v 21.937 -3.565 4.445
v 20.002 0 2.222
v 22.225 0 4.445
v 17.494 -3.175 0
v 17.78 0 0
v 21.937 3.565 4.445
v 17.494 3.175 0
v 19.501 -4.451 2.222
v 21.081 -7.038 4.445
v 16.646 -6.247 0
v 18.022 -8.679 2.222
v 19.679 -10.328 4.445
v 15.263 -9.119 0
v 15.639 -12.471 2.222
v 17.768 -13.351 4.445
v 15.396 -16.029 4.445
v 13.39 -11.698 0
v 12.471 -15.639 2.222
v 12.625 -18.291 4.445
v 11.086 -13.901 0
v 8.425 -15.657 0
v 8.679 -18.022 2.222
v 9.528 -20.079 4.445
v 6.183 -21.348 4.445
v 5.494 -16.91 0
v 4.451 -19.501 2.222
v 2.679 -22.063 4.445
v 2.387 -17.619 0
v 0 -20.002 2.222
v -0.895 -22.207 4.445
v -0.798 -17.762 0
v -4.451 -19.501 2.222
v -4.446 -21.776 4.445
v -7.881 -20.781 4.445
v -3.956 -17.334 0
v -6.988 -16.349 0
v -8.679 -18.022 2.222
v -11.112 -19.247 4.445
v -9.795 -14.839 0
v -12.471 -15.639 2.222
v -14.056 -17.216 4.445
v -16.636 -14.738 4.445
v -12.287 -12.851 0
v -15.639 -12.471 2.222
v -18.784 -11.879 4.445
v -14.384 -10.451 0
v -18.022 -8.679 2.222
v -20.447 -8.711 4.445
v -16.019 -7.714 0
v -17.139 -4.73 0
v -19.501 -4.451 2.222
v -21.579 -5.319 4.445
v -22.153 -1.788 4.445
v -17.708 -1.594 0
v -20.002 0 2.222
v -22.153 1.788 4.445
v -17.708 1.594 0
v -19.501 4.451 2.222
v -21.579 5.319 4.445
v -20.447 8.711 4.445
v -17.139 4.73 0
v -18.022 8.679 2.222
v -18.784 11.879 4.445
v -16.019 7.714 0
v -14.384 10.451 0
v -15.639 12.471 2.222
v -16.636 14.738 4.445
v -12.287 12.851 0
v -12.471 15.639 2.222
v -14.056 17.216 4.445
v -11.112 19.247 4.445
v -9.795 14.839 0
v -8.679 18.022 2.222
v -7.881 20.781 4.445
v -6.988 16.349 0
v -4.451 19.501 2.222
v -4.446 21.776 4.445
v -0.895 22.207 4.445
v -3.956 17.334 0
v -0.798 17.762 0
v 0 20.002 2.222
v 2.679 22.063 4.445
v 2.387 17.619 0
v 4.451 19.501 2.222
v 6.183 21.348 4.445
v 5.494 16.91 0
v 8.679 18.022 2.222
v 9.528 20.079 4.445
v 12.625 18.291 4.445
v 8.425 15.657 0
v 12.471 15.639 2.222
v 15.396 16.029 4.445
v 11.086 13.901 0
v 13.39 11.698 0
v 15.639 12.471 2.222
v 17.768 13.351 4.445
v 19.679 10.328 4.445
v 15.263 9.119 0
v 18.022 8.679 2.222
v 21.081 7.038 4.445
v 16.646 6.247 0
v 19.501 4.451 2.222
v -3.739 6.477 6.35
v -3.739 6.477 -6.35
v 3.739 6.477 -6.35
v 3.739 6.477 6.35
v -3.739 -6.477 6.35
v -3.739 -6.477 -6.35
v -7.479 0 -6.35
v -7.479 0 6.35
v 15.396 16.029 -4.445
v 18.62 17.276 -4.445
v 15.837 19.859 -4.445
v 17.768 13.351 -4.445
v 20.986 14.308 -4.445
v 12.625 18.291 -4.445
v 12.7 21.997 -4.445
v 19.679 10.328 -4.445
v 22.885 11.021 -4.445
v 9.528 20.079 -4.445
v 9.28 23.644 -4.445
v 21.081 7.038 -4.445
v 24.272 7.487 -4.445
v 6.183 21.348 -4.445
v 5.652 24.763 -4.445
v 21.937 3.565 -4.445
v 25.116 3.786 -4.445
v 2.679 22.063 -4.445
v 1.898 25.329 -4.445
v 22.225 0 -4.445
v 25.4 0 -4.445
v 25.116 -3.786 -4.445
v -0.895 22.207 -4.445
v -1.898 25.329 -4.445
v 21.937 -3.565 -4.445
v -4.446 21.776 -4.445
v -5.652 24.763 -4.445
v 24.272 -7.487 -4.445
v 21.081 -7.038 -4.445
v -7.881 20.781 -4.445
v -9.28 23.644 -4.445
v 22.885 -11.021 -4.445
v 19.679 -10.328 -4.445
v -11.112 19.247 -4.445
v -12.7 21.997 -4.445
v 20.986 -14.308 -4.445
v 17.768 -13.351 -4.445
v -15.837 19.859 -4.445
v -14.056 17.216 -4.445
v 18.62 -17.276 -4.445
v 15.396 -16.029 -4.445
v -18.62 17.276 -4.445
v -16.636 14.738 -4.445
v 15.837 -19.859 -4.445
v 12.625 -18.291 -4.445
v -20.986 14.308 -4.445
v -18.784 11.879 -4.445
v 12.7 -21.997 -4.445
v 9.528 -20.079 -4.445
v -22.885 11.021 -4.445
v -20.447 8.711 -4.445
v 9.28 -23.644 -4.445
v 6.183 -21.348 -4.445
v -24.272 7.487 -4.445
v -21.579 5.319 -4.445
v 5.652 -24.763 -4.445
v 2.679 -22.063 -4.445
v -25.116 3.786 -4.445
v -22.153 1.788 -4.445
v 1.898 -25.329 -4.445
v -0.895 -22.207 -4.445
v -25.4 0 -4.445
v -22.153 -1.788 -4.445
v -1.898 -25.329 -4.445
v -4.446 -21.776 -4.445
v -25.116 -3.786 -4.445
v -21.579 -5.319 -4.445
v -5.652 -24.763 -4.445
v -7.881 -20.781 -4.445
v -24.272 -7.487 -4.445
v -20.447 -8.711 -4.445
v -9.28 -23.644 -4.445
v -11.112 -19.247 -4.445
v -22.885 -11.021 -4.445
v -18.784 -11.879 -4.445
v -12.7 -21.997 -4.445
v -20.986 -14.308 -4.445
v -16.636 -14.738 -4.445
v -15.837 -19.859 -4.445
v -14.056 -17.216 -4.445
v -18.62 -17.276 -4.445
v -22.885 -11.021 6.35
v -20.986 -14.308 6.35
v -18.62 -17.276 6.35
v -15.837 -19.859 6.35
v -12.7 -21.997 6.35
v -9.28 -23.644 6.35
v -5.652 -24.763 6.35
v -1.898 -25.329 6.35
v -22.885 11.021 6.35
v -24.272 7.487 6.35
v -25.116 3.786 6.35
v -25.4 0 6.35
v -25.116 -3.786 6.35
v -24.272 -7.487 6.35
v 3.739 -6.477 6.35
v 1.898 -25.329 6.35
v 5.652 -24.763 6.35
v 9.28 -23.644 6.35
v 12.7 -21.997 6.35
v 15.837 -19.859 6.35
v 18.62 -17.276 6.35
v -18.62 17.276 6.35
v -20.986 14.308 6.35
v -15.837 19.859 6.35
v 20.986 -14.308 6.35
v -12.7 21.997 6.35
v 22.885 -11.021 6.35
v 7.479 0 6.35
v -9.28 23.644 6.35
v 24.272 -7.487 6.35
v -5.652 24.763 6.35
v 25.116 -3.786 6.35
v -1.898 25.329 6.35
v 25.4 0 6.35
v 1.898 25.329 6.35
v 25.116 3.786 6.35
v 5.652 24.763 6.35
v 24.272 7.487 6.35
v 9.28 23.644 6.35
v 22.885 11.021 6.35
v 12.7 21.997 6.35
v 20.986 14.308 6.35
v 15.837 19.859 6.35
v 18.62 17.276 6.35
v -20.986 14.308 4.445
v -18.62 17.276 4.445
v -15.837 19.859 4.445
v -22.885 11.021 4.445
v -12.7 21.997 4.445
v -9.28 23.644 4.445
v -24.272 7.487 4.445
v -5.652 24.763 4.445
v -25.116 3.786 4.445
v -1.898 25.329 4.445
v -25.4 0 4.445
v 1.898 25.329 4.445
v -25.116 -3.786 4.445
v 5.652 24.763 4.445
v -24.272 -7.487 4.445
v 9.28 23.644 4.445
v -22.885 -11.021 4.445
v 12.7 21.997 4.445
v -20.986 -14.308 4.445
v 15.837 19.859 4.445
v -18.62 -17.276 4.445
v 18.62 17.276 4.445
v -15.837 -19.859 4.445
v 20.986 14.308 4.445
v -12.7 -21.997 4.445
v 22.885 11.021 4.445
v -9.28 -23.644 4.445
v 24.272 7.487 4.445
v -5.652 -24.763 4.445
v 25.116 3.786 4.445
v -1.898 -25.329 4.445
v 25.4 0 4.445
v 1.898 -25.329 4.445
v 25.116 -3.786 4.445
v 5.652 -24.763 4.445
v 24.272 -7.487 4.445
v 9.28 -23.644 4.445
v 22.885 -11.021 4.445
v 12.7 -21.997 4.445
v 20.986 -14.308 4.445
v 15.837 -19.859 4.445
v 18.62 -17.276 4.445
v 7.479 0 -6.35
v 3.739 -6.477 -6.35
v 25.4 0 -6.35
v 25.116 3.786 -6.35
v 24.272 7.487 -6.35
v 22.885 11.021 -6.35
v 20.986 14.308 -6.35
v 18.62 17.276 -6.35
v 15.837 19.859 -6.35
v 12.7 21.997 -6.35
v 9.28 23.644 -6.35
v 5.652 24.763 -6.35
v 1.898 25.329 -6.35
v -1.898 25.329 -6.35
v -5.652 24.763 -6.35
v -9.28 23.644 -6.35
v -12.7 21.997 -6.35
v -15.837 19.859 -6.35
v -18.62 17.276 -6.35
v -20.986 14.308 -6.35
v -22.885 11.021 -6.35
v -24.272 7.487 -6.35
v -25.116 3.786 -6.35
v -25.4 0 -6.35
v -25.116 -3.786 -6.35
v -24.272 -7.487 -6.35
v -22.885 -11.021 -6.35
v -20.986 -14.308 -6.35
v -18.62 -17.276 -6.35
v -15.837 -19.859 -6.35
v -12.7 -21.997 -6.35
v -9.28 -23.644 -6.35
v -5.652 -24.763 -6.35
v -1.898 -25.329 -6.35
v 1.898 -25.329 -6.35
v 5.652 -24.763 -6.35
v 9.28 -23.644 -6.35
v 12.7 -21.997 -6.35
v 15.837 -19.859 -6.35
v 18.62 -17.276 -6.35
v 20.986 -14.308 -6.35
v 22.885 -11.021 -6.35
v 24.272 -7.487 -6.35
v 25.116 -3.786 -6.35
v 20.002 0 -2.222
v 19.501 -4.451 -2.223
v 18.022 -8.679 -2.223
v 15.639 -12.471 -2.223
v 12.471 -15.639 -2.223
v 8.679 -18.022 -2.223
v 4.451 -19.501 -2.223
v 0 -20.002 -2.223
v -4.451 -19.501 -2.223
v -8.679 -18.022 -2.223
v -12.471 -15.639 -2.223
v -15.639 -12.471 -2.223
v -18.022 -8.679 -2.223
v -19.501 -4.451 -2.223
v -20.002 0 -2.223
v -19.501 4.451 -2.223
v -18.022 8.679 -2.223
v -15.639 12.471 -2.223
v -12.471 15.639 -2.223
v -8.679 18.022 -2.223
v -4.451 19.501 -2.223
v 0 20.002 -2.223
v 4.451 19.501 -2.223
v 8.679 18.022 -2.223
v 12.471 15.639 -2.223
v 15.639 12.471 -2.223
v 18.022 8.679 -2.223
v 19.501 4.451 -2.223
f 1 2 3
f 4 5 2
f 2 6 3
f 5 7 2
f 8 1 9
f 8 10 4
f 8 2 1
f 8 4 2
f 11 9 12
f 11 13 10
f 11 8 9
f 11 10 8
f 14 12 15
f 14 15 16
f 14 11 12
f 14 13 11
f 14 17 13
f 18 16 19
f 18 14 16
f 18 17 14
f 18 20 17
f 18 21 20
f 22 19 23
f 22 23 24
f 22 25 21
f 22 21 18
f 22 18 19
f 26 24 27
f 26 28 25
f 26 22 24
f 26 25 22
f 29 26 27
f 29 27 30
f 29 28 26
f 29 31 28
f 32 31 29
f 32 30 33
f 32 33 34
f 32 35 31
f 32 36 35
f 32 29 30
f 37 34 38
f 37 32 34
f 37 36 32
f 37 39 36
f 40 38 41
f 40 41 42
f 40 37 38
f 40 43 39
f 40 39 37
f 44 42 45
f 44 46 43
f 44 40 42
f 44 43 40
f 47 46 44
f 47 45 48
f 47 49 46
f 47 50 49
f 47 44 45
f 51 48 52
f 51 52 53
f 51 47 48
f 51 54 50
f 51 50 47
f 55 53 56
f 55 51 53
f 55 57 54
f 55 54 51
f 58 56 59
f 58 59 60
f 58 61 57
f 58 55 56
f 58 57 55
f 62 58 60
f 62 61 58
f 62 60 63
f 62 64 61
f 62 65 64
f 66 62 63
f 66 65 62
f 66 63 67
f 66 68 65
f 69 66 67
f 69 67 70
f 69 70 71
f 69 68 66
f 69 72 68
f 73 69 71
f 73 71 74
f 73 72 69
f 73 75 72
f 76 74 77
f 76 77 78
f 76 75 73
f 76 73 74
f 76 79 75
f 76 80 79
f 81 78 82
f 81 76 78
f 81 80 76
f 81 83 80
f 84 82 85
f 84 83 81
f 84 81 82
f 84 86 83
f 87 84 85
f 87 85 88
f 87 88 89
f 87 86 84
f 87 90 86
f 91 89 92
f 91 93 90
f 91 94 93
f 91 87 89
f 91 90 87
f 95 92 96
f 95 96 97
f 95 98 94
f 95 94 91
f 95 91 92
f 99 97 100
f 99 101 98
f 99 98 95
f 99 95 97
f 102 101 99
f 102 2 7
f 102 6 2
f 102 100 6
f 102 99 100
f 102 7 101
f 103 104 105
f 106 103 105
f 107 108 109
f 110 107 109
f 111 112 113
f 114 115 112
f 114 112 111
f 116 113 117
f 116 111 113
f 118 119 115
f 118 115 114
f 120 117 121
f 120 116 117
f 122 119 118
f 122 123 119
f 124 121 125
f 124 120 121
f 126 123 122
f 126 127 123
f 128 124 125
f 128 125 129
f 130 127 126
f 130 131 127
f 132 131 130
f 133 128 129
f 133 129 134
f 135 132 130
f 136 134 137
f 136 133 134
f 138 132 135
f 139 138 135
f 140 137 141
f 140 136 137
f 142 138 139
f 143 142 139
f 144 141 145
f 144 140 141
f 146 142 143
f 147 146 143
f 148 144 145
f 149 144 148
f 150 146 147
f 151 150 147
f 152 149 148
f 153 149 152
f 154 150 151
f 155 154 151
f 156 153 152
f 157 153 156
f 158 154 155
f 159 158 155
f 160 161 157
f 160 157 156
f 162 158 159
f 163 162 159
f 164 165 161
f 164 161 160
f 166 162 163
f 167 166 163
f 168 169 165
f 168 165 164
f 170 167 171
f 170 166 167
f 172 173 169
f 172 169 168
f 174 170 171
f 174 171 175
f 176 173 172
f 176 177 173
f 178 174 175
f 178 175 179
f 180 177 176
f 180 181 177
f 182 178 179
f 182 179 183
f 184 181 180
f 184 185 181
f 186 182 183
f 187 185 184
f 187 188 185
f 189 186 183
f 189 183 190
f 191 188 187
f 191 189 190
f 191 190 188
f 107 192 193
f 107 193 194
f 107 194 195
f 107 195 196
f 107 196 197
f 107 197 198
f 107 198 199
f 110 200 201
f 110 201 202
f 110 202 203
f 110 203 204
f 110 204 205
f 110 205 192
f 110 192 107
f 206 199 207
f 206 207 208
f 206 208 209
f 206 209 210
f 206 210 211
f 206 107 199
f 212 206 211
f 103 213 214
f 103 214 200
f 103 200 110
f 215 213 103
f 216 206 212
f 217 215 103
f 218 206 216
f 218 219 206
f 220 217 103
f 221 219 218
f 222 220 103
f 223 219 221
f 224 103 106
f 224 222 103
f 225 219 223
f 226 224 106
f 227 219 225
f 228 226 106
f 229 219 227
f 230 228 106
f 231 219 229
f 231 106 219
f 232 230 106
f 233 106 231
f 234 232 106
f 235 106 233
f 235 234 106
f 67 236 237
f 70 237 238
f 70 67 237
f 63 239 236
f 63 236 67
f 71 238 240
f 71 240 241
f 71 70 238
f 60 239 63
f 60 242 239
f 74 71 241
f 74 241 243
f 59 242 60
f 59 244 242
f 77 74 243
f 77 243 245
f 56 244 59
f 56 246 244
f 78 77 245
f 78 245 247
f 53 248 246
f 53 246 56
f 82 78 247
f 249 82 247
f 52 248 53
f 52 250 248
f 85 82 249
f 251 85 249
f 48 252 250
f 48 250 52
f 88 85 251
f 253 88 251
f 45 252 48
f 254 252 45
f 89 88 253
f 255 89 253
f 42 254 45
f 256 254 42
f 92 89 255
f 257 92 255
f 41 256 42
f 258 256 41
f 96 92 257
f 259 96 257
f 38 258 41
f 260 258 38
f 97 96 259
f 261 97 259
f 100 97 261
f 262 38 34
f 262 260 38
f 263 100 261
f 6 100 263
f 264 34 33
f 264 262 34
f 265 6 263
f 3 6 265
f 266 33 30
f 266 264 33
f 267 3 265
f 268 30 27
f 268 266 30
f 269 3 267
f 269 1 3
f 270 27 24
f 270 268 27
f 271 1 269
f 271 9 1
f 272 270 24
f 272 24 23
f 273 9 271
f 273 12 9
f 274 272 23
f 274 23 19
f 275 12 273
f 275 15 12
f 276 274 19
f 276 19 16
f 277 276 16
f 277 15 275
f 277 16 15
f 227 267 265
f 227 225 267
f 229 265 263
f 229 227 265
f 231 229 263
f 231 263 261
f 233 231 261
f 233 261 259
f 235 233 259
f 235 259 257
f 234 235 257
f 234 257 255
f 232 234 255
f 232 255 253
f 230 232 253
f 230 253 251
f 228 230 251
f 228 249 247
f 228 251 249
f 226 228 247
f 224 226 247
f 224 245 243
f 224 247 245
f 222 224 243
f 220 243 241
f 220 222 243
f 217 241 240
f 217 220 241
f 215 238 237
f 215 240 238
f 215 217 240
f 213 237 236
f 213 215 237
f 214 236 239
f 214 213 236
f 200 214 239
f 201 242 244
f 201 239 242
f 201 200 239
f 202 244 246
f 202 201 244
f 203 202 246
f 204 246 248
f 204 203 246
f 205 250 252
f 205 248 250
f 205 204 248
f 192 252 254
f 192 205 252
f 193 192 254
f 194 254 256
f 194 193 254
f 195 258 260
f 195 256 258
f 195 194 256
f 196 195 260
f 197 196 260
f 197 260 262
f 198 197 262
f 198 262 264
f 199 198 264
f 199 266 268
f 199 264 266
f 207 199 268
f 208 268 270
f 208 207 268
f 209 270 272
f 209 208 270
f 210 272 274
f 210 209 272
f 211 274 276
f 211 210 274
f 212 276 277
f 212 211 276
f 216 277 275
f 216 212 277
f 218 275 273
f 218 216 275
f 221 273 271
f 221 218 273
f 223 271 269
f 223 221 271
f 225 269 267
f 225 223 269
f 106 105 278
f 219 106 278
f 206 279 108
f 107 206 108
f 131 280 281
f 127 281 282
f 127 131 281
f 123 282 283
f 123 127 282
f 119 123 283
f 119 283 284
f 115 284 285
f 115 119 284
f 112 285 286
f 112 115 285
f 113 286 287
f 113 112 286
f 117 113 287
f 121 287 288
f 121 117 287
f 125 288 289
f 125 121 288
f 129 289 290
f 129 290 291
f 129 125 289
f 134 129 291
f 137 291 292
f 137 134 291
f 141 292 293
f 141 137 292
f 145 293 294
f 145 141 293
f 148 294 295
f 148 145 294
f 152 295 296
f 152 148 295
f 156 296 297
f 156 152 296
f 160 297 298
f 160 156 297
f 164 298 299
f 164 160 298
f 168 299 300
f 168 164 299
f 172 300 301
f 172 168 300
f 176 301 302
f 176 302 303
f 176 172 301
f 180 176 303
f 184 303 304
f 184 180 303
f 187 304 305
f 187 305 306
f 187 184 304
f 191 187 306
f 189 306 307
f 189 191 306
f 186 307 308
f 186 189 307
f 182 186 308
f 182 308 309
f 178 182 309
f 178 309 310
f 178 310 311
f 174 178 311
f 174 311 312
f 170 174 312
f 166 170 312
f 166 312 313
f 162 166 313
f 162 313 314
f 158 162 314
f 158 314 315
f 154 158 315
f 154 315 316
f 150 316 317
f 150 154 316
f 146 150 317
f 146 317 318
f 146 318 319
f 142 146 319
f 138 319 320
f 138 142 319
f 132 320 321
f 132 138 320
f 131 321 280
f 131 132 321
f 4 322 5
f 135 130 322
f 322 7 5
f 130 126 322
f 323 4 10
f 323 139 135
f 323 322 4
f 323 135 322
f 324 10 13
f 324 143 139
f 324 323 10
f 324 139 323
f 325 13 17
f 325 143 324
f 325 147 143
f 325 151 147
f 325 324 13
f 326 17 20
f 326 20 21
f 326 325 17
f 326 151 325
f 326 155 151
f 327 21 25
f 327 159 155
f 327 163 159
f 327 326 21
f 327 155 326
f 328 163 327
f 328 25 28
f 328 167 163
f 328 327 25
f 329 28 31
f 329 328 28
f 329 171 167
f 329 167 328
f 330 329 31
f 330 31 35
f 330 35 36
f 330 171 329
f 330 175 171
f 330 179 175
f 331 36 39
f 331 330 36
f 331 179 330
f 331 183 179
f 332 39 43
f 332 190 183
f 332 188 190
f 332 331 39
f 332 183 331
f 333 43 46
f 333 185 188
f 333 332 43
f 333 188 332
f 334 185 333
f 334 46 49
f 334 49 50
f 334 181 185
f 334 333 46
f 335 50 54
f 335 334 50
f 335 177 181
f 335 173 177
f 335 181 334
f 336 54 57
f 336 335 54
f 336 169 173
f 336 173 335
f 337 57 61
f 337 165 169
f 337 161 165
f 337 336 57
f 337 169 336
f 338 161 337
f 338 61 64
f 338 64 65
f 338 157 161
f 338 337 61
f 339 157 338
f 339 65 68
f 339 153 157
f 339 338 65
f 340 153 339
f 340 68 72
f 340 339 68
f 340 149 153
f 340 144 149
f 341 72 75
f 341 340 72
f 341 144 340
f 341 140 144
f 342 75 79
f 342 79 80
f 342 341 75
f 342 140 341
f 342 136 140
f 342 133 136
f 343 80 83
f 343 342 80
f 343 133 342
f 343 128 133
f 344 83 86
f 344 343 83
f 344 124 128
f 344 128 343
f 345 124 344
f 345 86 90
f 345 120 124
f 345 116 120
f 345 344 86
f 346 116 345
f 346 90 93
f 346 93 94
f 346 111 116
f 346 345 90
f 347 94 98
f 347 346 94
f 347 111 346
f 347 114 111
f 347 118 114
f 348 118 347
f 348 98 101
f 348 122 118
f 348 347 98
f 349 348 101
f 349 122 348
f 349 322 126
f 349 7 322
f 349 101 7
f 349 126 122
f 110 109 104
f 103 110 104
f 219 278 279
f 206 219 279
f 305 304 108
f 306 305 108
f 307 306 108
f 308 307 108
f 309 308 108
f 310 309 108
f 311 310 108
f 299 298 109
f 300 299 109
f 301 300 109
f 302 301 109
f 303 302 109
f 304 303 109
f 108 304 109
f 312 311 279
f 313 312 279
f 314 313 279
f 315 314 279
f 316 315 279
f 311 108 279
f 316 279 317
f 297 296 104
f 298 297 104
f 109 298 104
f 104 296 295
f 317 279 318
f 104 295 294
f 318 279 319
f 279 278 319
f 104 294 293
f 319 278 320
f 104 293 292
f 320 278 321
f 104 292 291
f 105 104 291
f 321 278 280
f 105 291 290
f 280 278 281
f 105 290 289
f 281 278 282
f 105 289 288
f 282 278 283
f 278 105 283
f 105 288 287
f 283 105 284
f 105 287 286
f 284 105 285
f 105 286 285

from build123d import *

# Parameters (mm, degrees)
SKETCH1_R           = 25.4
BOSS_EXTRUDE1_DEPTH = 6.35
CUT_EXTRUDE1_DEPTH  = 39.1


with BuildPart() as part:
    # Sketch1 → Boss-Extrude1 (new, symmetric)
    with BuildSketch(Plane.XY):
        Circle(SKETCH1_R)
    extrude(amount=BOSS_EXTRUDE1_DEPTH, both=True)

    # Sketch3 → Cut-Revolve1 (revolve, cut)
    with BuildSketch(Plane(origin=(0, 0, 0), x_dir=(1, 0, 0), z_dir=(0, 1, 0)), mode=Mode.PRIVATE) as cut_revolve1_sk:
        Polygon((-25.4, 4.445), (-25.4, -4.445), (-22.225, -4.445), (-17.78, 0), (-22.225, 4.445), align=None)
    revolve(cut_revolve1_sk.sketch.rotate(Axis((0, 0, 17.119668281), (0, 0, -1)), 180), axis=Axis((0, 0, 17.119668281), (0, 0, -1)), mode=Mode.SUBTRACT)

    # Sketch4 → Cut-Extrude1 (cut, through all)
    with BuildSketch(Plane(origin=(0, 0, -6.35), x_dir=(-1, 0, 0), z_dir=(0, 0, -1))):
        Polygon((7.478995387, 0), (3.739497694, 6.477), (-3.739497694, 6.477), (-7.478995387, 0), (-3.739497694, -6.477), (3.739497694, -6.477), align=None)
    extrude(amount=-CUT_EXTRUDE1_DEPTH, mode=Mode.SUBTRACT)


solid = part.part
